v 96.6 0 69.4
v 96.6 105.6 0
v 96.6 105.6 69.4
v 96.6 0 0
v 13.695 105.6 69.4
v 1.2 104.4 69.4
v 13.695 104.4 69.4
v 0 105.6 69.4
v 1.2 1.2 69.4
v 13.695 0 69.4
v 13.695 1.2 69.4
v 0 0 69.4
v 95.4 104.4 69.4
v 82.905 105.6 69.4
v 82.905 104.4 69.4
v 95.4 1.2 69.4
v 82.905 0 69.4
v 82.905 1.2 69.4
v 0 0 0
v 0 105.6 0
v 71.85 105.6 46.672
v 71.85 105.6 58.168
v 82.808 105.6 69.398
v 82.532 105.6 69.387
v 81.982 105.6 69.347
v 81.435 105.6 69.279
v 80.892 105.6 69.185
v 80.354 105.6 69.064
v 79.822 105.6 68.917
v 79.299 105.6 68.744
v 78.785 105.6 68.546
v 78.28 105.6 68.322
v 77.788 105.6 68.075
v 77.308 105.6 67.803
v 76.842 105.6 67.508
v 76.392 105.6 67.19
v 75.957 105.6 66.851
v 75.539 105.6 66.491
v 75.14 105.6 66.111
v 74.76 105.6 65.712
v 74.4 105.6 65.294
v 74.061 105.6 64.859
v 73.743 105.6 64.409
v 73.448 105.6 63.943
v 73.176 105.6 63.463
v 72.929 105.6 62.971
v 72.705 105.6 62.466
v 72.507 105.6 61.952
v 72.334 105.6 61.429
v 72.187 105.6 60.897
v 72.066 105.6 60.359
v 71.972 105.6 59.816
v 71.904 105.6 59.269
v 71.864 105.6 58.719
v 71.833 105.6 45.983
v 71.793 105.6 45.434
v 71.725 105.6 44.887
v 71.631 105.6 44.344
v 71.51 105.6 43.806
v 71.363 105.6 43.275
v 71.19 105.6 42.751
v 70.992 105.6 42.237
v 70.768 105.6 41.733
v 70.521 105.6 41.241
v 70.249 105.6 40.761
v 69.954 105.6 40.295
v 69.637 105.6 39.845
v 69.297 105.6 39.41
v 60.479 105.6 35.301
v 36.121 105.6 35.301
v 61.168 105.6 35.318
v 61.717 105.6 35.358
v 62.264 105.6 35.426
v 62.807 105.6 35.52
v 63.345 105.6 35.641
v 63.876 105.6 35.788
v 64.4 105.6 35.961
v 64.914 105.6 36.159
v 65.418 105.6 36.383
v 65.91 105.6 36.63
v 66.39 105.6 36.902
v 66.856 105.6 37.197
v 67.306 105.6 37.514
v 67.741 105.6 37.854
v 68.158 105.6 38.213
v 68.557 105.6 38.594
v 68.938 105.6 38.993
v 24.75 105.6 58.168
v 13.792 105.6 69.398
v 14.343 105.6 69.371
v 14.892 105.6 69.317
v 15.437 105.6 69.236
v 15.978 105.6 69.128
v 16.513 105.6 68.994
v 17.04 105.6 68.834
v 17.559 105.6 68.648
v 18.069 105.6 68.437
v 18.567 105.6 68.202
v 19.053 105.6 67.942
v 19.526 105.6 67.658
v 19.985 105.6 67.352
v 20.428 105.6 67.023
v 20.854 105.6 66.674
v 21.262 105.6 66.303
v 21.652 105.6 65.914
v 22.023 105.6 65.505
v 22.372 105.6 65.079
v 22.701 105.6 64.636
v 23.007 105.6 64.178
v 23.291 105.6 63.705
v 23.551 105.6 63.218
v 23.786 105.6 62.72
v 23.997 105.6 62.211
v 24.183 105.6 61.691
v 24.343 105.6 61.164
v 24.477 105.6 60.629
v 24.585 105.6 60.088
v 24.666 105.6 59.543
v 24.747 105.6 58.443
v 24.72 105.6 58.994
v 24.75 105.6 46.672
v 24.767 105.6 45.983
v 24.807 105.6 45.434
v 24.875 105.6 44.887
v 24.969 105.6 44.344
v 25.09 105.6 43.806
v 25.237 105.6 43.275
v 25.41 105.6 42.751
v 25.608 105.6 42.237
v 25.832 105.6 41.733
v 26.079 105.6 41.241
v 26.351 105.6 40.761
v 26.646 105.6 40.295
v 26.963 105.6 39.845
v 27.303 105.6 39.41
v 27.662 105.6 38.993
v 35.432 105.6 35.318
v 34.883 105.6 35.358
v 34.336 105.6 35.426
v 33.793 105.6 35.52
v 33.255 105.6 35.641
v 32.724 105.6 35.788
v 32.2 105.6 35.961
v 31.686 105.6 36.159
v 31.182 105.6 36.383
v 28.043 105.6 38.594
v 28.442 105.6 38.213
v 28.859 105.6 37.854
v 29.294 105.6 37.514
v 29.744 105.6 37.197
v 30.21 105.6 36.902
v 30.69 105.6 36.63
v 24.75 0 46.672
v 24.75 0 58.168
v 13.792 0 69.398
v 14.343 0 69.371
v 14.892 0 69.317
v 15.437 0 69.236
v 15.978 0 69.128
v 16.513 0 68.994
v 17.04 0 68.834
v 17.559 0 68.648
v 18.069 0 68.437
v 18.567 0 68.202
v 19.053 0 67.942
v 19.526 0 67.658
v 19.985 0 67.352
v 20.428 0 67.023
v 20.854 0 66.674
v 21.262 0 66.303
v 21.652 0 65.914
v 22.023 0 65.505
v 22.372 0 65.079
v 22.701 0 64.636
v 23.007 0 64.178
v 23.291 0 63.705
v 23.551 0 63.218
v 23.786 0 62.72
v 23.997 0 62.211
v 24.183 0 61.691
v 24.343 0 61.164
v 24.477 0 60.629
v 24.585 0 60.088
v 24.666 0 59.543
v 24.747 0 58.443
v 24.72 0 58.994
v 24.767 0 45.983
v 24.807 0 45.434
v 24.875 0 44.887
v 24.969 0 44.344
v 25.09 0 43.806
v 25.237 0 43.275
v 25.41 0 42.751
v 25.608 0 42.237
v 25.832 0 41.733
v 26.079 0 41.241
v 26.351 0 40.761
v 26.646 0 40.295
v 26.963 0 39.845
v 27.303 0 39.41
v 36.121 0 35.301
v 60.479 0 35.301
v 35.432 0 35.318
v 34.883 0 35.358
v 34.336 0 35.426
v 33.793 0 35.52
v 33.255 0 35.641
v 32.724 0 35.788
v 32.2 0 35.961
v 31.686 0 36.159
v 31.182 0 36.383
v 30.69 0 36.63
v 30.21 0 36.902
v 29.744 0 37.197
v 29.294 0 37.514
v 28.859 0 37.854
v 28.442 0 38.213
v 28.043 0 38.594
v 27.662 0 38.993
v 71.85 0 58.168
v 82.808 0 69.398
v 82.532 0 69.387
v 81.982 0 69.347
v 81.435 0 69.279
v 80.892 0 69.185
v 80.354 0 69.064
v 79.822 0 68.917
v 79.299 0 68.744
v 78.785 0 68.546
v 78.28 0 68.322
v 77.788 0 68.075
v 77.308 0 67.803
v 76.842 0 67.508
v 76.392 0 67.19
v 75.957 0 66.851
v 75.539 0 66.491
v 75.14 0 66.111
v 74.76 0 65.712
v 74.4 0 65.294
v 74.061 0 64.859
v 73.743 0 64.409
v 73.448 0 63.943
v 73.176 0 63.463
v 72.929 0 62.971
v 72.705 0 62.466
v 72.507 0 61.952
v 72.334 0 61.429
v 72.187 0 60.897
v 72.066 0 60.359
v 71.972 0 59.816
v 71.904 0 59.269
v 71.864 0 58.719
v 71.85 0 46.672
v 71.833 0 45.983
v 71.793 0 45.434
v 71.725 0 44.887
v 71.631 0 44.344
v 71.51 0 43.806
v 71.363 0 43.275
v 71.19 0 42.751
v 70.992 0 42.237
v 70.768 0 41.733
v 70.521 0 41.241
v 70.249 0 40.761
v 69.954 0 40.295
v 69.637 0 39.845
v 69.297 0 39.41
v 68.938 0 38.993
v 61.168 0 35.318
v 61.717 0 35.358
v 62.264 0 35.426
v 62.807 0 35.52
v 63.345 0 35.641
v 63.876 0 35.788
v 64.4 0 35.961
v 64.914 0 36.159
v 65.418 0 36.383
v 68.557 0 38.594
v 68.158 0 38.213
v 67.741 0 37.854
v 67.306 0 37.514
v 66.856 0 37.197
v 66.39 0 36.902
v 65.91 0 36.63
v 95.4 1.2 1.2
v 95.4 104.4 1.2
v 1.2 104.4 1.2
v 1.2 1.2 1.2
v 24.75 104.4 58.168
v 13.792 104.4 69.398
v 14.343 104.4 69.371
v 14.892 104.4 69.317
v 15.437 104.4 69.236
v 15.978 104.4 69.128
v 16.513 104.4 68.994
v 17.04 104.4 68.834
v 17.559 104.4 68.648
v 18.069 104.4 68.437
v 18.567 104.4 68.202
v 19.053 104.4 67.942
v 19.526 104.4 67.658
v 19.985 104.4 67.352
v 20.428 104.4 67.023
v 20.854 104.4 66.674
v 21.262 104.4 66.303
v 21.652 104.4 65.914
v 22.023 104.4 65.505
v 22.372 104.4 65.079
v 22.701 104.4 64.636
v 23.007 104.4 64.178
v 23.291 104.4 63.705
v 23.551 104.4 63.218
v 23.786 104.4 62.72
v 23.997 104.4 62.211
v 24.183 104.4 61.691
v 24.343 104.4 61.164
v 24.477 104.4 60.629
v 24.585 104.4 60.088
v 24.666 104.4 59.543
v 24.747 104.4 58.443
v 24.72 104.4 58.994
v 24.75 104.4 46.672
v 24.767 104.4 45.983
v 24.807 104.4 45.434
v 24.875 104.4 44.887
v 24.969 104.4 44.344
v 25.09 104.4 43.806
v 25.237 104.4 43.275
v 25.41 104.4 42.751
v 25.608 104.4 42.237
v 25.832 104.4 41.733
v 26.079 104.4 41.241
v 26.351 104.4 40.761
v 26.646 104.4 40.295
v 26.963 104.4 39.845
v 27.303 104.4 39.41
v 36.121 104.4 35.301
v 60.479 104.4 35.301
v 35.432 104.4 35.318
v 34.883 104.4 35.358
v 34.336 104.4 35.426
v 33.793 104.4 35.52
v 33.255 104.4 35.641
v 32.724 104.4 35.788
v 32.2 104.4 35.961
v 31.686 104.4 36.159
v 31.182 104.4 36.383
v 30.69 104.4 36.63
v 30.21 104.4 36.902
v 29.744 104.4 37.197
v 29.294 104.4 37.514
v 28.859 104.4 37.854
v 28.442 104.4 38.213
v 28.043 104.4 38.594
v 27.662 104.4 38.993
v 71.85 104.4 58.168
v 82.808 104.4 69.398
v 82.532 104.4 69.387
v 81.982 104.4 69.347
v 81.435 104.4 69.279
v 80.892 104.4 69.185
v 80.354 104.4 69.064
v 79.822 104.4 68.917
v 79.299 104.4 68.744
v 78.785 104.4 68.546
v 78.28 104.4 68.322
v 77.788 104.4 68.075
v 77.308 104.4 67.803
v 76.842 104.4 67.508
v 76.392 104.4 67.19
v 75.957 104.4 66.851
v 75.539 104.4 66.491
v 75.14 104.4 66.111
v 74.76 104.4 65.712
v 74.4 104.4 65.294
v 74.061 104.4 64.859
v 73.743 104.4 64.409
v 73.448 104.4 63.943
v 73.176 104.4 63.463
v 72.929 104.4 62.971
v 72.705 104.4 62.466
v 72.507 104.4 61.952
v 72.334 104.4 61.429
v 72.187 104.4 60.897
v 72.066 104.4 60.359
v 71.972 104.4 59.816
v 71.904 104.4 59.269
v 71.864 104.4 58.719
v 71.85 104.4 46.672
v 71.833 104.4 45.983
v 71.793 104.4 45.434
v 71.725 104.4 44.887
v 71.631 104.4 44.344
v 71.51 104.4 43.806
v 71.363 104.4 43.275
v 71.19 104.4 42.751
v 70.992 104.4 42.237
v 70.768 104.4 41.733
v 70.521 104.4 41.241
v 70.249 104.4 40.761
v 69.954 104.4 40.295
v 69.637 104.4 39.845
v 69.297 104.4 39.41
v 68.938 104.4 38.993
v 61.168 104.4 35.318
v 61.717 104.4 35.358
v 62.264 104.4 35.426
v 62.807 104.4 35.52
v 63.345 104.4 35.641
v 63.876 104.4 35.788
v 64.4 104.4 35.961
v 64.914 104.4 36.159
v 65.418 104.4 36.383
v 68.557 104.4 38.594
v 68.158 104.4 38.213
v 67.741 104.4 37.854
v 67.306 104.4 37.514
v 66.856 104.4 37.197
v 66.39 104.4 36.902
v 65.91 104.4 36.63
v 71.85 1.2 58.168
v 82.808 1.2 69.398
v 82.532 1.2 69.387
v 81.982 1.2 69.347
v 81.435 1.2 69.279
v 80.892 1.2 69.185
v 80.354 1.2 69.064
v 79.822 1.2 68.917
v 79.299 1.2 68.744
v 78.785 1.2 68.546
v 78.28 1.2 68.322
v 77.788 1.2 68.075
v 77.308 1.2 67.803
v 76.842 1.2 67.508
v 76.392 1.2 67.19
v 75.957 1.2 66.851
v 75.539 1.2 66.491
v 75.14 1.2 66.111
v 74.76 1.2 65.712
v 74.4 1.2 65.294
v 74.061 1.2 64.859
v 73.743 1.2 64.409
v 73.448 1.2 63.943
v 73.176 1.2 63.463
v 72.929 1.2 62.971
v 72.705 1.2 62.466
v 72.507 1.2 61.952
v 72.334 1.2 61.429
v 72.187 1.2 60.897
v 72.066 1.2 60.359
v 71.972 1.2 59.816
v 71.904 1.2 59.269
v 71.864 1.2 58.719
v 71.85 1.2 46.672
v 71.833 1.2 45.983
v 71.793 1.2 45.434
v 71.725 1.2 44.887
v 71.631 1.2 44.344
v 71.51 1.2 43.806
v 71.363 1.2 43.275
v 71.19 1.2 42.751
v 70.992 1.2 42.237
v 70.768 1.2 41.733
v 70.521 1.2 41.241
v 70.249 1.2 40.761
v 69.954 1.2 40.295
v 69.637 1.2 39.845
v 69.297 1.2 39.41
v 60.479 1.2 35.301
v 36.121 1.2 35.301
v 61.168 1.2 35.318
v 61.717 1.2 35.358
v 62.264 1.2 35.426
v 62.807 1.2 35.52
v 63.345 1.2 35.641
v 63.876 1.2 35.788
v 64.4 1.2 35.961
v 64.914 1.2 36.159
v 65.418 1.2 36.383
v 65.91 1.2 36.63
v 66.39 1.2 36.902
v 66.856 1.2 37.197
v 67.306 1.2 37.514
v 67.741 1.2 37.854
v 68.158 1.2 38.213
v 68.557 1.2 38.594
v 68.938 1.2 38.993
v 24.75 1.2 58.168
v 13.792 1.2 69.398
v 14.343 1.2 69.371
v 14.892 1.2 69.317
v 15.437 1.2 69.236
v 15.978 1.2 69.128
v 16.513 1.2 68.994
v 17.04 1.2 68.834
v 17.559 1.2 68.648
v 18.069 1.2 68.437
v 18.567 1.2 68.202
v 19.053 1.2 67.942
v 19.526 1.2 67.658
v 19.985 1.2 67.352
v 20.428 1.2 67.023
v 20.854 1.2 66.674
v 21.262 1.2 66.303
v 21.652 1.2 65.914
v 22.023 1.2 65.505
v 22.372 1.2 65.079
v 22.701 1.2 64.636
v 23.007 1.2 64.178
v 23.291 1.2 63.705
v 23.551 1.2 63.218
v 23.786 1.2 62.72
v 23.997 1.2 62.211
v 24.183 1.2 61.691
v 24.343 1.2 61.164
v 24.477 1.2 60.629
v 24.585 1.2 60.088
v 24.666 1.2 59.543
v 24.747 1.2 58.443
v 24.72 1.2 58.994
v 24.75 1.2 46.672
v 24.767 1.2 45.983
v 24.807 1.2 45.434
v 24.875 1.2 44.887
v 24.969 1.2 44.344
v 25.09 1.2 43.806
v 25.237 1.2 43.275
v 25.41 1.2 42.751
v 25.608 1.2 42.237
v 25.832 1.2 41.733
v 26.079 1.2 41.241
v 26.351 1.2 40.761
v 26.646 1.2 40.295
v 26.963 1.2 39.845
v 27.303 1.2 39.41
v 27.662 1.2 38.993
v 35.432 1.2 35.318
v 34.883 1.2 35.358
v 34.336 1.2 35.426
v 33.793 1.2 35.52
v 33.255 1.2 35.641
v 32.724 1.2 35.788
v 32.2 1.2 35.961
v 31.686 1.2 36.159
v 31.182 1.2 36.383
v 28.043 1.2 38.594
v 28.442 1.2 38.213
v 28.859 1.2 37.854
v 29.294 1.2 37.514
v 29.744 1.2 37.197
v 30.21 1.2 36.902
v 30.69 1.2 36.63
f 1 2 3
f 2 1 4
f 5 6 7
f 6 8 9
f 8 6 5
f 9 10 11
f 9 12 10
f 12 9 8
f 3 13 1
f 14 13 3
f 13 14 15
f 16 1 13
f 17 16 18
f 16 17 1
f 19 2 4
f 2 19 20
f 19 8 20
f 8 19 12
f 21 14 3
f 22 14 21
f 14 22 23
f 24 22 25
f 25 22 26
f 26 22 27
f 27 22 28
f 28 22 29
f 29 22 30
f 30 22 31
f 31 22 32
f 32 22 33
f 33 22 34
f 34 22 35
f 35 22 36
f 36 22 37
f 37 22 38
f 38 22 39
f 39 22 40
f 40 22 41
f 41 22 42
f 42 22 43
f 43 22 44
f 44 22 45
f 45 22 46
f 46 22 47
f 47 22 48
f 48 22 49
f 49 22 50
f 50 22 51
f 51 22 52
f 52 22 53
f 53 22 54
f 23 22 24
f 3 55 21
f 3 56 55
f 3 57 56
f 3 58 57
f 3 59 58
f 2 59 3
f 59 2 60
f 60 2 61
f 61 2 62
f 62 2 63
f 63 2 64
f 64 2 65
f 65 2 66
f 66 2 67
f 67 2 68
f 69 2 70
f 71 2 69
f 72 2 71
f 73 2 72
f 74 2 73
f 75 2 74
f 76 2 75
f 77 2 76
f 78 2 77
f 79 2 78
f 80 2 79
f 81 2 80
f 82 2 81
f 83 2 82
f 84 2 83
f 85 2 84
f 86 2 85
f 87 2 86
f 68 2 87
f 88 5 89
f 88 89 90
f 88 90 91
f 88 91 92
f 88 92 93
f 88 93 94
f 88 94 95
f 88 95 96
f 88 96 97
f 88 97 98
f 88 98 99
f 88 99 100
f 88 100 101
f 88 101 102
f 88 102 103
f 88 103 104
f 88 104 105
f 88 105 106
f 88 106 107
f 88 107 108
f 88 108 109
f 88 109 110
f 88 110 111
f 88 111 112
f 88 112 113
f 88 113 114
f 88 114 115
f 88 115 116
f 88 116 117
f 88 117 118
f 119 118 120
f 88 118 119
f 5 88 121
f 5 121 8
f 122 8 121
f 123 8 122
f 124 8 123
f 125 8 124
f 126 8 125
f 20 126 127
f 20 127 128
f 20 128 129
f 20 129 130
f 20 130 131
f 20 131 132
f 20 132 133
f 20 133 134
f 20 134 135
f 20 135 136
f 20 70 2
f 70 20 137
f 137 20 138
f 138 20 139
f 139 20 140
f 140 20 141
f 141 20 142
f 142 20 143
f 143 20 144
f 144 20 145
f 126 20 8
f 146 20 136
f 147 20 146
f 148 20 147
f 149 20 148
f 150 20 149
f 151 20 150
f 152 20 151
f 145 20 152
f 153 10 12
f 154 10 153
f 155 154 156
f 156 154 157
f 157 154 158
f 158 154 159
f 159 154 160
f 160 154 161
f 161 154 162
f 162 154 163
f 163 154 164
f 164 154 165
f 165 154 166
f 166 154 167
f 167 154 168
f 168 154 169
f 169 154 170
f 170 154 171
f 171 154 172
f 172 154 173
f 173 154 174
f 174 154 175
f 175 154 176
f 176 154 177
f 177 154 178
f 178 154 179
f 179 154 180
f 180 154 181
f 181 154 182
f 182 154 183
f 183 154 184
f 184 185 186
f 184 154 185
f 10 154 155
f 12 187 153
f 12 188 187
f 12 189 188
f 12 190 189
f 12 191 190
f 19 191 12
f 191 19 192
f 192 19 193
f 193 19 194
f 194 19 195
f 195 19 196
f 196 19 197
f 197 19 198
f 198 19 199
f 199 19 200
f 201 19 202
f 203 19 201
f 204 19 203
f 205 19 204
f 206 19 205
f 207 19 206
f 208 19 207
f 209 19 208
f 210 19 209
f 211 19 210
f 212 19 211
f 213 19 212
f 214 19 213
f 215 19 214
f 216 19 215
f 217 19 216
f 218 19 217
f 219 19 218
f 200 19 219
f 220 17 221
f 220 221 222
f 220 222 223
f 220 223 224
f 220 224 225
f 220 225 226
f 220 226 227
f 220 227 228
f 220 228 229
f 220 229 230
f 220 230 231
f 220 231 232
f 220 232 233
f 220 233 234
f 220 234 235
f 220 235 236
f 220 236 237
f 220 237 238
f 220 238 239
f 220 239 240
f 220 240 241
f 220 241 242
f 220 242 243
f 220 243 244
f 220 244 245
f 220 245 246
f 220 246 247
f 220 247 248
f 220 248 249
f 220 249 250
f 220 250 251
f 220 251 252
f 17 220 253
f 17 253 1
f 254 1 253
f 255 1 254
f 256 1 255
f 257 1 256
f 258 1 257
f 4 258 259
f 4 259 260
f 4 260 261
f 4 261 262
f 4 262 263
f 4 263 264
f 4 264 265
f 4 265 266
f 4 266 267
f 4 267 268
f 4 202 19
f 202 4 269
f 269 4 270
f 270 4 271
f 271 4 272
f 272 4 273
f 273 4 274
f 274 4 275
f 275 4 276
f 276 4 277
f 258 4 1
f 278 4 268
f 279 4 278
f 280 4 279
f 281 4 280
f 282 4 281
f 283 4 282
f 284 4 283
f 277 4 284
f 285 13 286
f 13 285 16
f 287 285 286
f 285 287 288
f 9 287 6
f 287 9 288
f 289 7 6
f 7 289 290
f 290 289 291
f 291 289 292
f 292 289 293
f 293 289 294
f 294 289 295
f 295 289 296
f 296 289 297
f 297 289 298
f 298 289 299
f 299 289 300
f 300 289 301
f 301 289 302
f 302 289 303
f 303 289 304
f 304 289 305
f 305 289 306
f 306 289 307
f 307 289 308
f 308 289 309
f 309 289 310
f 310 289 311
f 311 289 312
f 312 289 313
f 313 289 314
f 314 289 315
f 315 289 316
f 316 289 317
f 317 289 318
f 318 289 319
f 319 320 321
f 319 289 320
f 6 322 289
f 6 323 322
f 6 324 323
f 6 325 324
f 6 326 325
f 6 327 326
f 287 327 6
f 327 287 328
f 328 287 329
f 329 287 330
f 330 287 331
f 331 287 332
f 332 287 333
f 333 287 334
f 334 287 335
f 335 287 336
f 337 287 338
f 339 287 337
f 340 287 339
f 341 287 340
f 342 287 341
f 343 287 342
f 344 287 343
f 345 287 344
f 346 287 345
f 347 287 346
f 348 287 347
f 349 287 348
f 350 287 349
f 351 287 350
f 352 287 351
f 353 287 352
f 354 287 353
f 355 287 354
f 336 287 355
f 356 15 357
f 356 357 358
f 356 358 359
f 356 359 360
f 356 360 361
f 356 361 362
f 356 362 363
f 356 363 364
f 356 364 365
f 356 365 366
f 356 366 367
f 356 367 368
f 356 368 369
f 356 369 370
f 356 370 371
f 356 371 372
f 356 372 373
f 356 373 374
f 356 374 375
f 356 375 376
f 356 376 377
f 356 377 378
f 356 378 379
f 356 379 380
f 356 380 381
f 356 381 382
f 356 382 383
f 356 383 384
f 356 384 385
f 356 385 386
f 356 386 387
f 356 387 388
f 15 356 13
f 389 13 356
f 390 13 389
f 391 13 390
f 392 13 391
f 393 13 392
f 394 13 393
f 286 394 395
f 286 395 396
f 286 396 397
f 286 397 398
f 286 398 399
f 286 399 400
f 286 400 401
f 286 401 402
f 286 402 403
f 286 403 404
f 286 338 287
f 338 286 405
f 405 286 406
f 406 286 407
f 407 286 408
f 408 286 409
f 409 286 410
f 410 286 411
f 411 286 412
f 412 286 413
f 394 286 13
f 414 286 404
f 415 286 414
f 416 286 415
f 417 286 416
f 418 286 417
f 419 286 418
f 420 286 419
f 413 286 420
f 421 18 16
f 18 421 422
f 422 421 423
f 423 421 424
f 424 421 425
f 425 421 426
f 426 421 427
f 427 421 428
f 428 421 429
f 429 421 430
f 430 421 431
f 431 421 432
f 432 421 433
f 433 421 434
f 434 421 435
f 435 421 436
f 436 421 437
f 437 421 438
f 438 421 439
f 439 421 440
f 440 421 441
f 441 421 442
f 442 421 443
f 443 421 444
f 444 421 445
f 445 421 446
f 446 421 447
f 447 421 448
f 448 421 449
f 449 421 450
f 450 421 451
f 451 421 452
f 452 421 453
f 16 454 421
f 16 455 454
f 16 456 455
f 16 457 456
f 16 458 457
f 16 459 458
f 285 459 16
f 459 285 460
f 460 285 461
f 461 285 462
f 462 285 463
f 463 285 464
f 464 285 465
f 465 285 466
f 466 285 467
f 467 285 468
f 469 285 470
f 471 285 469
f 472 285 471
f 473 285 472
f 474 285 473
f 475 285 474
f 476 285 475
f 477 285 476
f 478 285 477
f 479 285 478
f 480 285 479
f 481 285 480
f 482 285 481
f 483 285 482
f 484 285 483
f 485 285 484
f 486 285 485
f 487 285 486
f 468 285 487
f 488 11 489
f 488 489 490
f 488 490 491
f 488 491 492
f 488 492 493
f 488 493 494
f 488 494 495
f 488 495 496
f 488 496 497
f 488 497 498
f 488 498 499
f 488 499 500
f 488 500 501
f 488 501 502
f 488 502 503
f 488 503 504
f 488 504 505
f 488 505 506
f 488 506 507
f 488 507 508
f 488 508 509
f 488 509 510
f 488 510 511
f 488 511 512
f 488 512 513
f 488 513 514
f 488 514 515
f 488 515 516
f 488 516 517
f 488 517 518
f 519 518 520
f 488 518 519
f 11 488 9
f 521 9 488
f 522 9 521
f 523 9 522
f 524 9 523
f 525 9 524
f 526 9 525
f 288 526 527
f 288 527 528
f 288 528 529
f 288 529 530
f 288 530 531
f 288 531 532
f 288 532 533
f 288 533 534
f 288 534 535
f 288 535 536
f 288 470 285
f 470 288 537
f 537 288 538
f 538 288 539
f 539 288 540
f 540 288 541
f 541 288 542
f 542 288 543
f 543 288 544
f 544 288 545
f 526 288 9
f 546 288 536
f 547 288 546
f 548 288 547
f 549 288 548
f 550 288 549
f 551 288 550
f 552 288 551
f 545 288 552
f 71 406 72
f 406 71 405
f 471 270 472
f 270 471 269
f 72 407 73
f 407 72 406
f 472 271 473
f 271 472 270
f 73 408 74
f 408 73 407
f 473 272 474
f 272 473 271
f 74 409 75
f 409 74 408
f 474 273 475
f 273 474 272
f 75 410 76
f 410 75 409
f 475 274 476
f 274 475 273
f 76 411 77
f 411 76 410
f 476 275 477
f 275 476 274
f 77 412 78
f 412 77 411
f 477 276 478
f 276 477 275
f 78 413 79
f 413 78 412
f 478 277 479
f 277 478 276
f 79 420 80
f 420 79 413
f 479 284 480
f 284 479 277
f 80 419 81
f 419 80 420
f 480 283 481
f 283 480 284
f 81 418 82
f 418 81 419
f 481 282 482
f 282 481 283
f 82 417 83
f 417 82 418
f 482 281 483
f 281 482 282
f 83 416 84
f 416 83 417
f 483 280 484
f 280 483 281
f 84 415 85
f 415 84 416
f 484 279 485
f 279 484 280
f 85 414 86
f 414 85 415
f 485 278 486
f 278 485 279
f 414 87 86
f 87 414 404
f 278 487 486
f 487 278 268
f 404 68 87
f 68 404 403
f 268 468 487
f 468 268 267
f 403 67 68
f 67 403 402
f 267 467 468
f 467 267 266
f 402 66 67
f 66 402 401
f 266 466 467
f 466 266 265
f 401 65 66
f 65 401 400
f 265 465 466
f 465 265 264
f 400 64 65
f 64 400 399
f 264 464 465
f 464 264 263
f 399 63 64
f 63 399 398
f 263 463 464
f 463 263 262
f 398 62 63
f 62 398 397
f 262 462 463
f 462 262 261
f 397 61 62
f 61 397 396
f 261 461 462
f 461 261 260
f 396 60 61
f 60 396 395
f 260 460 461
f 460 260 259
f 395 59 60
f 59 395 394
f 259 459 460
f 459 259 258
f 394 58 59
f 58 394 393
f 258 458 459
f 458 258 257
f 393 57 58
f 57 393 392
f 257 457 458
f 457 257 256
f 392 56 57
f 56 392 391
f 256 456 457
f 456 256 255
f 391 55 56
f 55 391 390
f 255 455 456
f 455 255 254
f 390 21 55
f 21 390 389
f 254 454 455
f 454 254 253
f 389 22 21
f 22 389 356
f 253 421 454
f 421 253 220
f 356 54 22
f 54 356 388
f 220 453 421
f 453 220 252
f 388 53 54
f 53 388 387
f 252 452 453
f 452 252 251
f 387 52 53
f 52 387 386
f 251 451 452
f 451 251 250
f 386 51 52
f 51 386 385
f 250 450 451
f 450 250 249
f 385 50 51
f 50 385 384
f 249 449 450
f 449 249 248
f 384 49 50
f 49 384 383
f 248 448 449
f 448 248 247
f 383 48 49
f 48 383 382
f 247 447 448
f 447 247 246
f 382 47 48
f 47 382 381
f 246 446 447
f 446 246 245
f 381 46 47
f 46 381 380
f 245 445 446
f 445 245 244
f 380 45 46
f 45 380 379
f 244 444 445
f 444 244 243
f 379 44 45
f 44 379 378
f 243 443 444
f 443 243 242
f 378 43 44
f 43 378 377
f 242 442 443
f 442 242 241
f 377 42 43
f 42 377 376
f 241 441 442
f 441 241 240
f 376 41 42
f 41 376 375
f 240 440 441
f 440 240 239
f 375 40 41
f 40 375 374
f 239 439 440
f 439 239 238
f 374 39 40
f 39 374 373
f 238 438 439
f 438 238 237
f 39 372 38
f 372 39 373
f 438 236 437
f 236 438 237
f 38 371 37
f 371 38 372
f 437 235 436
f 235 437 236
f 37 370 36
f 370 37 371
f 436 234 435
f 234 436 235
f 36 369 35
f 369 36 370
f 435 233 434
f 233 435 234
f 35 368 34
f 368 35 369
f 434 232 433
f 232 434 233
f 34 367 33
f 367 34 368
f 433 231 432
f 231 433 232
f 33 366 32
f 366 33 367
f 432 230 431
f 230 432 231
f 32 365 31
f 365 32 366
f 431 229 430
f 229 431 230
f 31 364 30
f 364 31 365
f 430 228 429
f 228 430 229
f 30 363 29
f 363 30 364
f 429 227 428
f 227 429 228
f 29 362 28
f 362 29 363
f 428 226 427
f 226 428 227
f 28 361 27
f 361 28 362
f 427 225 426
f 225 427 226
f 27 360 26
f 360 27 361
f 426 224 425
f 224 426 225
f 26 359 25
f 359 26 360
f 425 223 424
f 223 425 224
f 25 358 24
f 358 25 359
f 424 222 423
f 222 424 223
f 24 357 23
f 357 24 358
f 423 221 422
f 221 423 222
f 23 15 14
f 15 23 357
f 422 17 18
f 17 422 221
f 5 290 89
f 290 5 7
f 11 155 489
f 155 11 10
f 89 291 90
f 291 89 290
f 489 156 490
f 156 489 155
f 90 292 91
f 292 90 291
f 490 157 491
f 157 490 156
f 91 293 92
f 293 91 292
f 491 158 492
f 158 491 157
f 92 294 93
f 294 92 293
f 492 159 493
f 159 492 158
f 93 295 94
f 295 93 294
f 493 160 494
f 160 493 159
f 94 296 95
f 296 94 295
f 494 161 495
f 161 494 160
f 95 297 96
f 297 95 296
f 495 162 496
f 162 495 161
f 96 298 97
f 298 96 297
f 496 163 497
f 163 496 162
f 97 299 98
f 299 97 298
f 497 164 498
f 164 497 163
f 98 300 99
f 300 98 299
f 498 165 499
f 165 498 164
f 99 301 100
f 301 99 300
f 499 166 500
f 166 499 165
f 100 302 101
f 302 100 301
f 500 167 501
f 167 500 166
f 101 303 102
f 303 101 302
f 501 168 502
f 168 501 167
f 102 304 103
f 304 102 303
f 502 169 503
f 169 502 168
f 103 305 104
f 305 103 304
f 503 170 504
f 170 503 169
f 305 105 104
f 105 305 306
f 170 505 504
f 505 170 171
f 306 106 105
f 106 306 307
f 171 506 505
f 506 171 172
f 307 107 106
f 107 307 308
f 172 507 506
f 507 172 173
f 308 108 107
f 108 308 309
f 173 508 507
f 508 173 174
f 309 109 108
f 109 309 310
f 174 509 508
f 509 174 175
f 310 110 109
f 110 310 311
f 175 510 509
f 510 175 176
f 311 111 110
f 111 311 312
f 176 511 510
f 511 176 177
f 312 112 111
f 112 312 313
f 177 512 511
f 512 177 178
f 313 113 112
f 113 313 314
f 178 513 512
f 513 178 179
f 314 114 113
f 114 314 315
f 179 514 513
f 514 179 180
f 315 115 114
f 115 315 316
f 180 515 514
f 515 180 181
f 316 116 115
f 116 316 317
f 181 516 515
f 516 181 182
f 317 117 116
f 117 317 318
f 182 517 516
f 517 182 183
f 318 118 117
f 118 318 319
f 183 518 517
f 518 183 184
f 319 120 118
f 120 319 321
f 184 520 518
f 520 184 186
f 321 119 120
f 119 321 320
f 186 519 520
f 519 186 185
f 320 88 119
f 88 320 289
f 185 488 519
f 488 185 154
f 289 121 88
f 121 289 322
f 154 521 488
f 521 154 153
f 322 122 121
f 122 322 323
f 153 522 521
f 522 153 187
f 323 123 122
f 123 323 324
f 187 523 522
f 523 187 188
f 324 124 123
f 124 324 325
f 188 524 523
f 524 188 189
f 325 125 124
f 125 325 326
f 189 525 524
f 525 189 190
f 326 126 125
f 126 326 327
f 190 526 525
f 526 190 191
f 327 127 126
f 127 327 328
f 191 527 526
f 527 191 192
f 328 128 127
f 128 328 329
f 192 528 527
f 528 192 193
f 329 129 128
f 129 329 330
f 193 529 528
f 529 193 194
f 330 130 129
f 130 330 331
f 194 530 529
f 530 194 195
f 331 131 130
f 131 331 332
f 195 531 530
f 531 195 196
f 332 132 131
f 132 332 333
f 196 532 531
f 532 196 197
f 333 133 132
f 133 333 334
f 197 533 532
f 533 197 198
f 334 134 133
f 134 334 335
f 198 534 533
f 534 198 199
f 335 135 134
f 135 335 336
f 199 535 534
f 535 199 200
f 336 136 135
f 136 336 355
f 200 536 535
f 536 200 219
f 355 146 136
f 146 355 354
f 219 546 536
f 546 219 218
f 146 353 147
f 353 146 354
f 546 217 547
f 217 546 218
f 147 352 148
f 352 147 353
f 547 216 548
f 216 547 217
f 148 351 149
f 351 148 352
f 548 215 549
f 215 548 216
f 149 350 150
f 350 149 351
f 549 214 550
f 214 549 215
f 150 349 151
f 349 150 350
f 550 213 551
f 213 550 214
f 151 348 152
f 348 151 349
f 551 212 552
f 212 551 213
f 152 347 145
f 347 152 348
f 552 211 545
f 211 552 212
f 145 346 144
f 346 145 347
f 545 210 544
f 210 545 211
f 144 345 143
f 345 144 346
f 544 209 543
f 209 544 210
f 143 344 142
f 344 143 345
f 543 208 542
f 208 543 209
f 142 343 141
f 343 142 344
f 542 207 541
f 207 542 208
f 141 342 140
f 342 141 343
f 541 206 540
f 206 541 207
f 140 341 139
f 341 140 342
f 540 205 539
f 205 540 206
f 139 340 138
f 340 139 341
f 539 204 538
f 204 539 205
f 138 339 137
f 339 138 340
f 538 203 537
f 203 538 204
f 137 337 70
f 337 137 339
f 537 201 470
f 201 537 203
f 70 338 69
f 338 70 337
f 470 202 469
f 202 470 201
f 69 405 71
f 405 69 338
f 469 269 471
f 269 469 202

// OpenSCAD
// file: ../../internal/tray.scad
// Copyright 2023 Joshua Star, All Rights Reserved

include <base.scad>
include <prim.scad>

module tray_basic(inner_size, r=0, thickness=DEFAULT_THICKNESS, bottom_thickness=undef) {

	half_z = inner_size.z / 2;
	radius = min(r, half_z);

	bottom_thk = bottom_thickness != undef ? bottom_thickness : thickness;

	thk2 = thickness * 2;

	outer_size = inner_size + [thk2, thk2, bottom_thk];
	echo("tray outer dimensions are: ", outer_size);

	inner_radius = radius - thickness;

	union() {
		difference() {
			// outer shell
			if (0 < r) {
				union() {
					translate([0, 0, bottom_thk])
						cylinder_cube([outer_size.x, outer_size.y, outer_size.z - bottom_thk], r=radius);
					cylinder_cube([outer_size.x, outer_size.y, bottom_thk], inner_radius, radius);
				}
			}
			else {
				cube(outer_size);
			}
			
			// lip cutout
			if (0 < radius) {
				translate([0, 0, inner_size.z + SMALL_NUM])
					cylinder_cube([outer_size.x, outer_size.y, bottom_thk], r1=inner_radius, r2=radius);
			}

			// inner cutout
			if (0 < radius) {
				translate([thickness, thickness, bottom_thk])
					rounded_cube(inner_size + [0, 0, bottom_thk], r=inner_radius, flat_top=true);
			}
			else {
				translate([thickness, thickness, bottom_thk])
						cube(inner_size + [0, 0, bottom_thk]);
			}
		}
	}
}

module tray_divided(size, r=0, div_x=1, div_y=1, thickness=DEFAULT_THICKNESS, bottom_thickness=undef, div_height=undef, div_thickness=undef) {

	bottom_thk = bottom_thickness != undef ? bottom_thickness : thickness;

	div_thk = div_thickness != undef ? div_thickness : thickness;
	div_z = div_height != undef ? div_height : size.z;

	max_div_z = 0 == r ? size.z : size.z - bottom_thk;
	clamped_div_z = min(div_z, max_div_z);

	x_minus_div = size.x - (div_thk * (div_x - 1));
	y_minus_div = size.y - (div_thk * (div_y - 1));

	x_off = (x_minus_div / div_x) + div_thk;
	y_off = (y_minus_div / div_y) + div_thk;
	
	union() {
		tray_basic(size, r=r, thickness=thickness, bottom_thickness=bottom_thk);

		// columns, along x
		for (i=[1:1:div_x-1]) {
			translate([i * x_off, thickness, bottom_thk])
				cube([div_thk, size.y, clamped_div_z]);
		}

		// rows, along y
		for (i=[1:1:div_y-1]) {
			translate([thickness, i * y_off, bottom_thk])
				cube([size.x, div_thk, clamped_div_z]);
		}
	}
}

module notch_cutter(h, r) {
	n = 6;
	rotate([0, 0, 180 / n]) cylinder_ngon(2 * r, h, n);
}

module tray_notched(size, div_x=1, div_y=1, thickness=DEFAULT_THICKNESS, bottom_thickness=undef, div_height=undef, div_thickness=undef, notch_lo_x=true, notch_hi_x=true) {

	bottom_thk = bottom_thickness != undef ? bottom_thickness : thickness;

	div_thk = div_thickness != undef ? div_thickness : thickness;
	div_z = div_height != undef ? div_height : size.z;

	x_minus_div = size.x - (div_thk * (div_x - 1));

	x_off = (x_minus_div / div_x) + div_thk;
	
	div_bias = (div_thk - x_off) / 2;

	notch_h = size.z + bottom_thk + 2 * SMALL_NUM;
	notch_r = x_off / 3;

	difference() {
		tray_divided(size, div_x=div_x, div_y=div_y, thickness=thickness, bottom_thickness=bottom_thk, div_height=div_z, div_thickness=div_thk);

		// notch along x
		for (i=[1:1:div_x]) {

			if (notch_lo_x) {
				translate([i * x_off + div_bias, thickness, -SMALL_NUM])
					notch_cutter(notch_h, notch_r);
			}

			if (notch_hi_x) {
				translate([i * x_off + div_bias, size.y + thickness, -SMALL_NUM])
					notch_cutter(notch_h, notch_r);
			}
		}
	}
}

// --- TESTING ---

//tray_basic([240, 120, 30], r=4);

//translate([-1.2, -1.2, 0]) tray_divided([200, 100, 5], div_x=20, div_y=10);
//tray_divided([180, 120, 30], r=15, div_x=3, div_y=2, div_height=25);

//translate([-1.2, -1.2, 0]) tray_notched([200, 100, 30], div_x=20, div_y=10);
// file: ../../internal/prim.scad
// Copyright 2023 Joshua Star, All Rights Reserved

module cylinder_cube(size, r1=1, r2=1, r=undef) {
	r1 = r != undef ? r : r1;
	r2 = r != undef ? r : r2;

	r_max = max(r1, r2);
	hull() {
		translate([r_max, r_max, 0])
			cylinder(size.z, r1, r2);
		translate([size.x - r_max, r_max, 0])
			cylinder(size.z, r1, r2);
		translate([r_max, size.y - r_max, 0])
			cylinder(size.z, r1, r2);
		translate([size.x - r_max, size.y - r_max, 0])
			cylinder(size.z, r1, r2);
	}
}

module cylinder_ngon(width, h, n=6, r=1) {
	hull() {
		for (i=[0:1:n-1]) {
			angl_off = 360 / n;
			posx_off = width / 2 - r;
			rotate([0, 0, i * angl_off]) translate([posx_off, 0, 0])
				cylinder(r=r, h=h);
		}
	}
}

module cylinder_trap(size, ratio, radius=1) {
	hull() {
		half_size_x = size.x / 2;
		translate([radius - half_size_x, radius, 0])
			cylinder(r=radius, h=size.z);
		translate([half_size_x - radius, radius, 0])
			cylinder(r=radius, h=size.z);
		translate([radius - ratio * half_size_x, size.y - radius, 0])
			cylinder(r=radius, h=size.z);
		translate([ratio * half_size_x - radius, size.y - radius, 0])
			cylinder(r=radius, h=size.z);
	}
}

module rounded_cube(size, r=1, flat_top=false) {
	
	half_z = size.z / 2;
	radius = min(r, half_z);
	
	hull() {
		// bottom 'points'
		translate([radius,radius,radius]) sphere(r=radius);
		translate([size.x-radius,radius,radius]) sphere(r=radius);
		translate([radius,size.y-radius,radius]) sphere(r=radius);
		translate([size.x-radius,size.y-radius,radius]) sphere(r=radius);

		// top 'points'
		pos_z = size.z - radius;
		if (flat_top) {
			translate([radius, radius, pos_z]) cylinder(r=radius, h=radius);
			translate([size.x-radius, radius, pos_z]) cylinder(r=radius, h=radius);
			translate([radius, size.y-radius, pos_z]) cylinder(r=radius, h=radius);
			translate([size.x-radius, size.y-radius, pos_z]) cylinder(r=radius, h=radius);
		}
		else {
			translate([radius, radius, pos_z]) sphere(r=radius);
			translate([size.x-radius, radius, pos_z]) sphere(r=radius);
			translate([radius, size.y-radius, pos_z]) sphere(r=radius);
			translate([size.x-radius, size.y-radius, pos_z]) sphere(r=radius);
		}
	}
}

// --- TESTING ---

//cylinder_cube([240, 120, 30], r=8);

//cylinder_cube([240, 120, 16], r1=4, r2=8);
//cylinder_cube([240, 120, 16], r1=8, r2=4);

//cylinder_ngon(10, 5, 7, 1);

//cylinder_trap([100, 50, 30], 0.5, radius=8);

//rounded_cube([240, 120, 30], r=12);
//rounded_cube([240, 120, 30], r=12, flat_top=true);
//rounded_cube([240, 120, 30], r=30, flat_top=true);
// file: ../../internal/math.scad
// Copyright 2023 Joshua Star, All Rights Reserved

function clamp(x, lower, upper) = x < lower ? lower : (upper < x ? upper : x);
function lerp(lower, upper, s) = (upper - lower) * s + lower;
// file: ../../internal/card.scad
// Copyright 2023 Joshua Star, All Rights Reserved

TOLERANCE_MIN = [0.4, 0.4];
TOLERANCE_MAX = [0.8, 0.8];

function std_card_dim() = [67, 93] + TOLERANCE_MIN; // gray
function amer_card_dim() = [59, 91] + TOLERANCE_MIN; // green
function euro_card_dim() = [62, 94] + TOLERANCE_MIN; // purple

function mini_amer_card_dim() = [44, 67] + TOLERANCE_MIN; // yellow
function mini_euro_card_dim() = [46, 71] + TOLERANCE_MIN; // ruby

function 7won_card_dim() = [67, 103] + TOLERANCE_MAX; // brown
function tarot_card_dim() = [73, 122] + TOLERANCE_MAX; // orange

function per_card_thickness() = 0.68;

function calc_card_stack(n, padding=1.2) = n * per_card_thickness() + padding;
// file: ../../internal/base.scad
// Copyright 2023 Joshua Star, All Rights Reserved

fn = $preview ? 16 : 128;
$fn = fn;

SMALL_NUM = $preview ? 0.02 : 0.001;

DEFAULT_PADDING = 1.6;
DEFAULT_THICKNESS = 1.2;
// file: ../../boardgame_tk.scad
// Copyright 2023 Joshua Star, All Rights Reserved

include <internal/base.scad>
include <internal/card.scad>
include <internal/math.scad>
include <internal/prim.scad>
include <internal/tray.scad>

function default_padding() = DEFAULT_PADDING;
function default_thickness() = DEFAULT_THICKNESS;

function gamebox_common() = [286, 286, 68]; // Terraforming Mars, Wingspan

function make_list(v, n) = [for(i=[0:n-1]) v];
function sum_list(v) = [for(p=v) 1] * v;

module card_display(card_size, height, num_stacks, padding=DEFAULT_PADDING, thickness=DEFAULT_THICKNESS, bottom_thickness=undef, div_thickness=undef) {

	div_thk = div_thickness != undef ? div_thickness : thickness;

	dim_x = (card_size.x + padding) * num_stacks + (div_thk * (num_stacks - 1));
	dim_y = card_size.y + padding;
	dim_z = height;

	tray_notched([dim_x, dim_y, dim_z], div_x=num_stacks, thickness=thickness, bottom_thickness=bottom_thickness, div_thickness=div_thickness, notch_hi_x=false);
}

module vertical_cutter(size, r=0.5) {
	difference() {
		translate([0, size.z, 0]) rotate([90, 0, 0])
		linear_extrude(height=size.z) {
			translate([0, r, 0])
			offset(r=-r) {
				offset(r=2*r) {
					union() {
						translate([-(size.x + 2 * r) / 2, 0, 0]) square([size.x + 2 * r, 1]);
						translate([-(size.x - 2 * r)/2, -size.y, 0]) square([size.x - 2 * r, size.y]);
					}
				}
			}
		}

		translate([-(size.x + r), -size.z, 0])
			cube([2 * (size.x + r), 3 * size.z, 2 * (size.y + r)]);
	}
}

module card_tray(card_size, stacks, num_columns=1, padding=[0.8, 0.8, 0.8], thickness=DEFAULT_THICKNESS, bottom_thickness=undef, div_height=undef, div_thickness=undef) {

	bottom_thk = bottom_thickness != undef ? bottom_thickness : thickness;

	div_thk = div_thickness != undef ? div_thickness : thickness;

	col_dim_x = card_size.y + padding.x;

	dim_x = col_dim_x * num_columns + div_thk * (num_columns - 1);
	dim_y = sum_list(stacks) + (div_thk + padding.y) * (len(stacks) - 1);
	dim_z = card_size.x + padding.z;

	div_z = div_height != undef ? div_height : dim_z;

	min_card_dim = min(card_size.x, card_size.y);
	cutter_radius = min_card_dim / 6;

	difference() {
		union() {
			tray_divided([dim_x, dim_y, dim_z], div_x=num_columns, thickness=thickness, bottom_thickness=bottom_thickness);

			div_offsets = [
				for (a=0, b=stacks[0]; a < (len(stacks) - 1); a = a + 1, b = b + (stacks[a]==undef?0:stacks[a]) + padding.y + div_thk)
					b
				];

			// columns, along x
			for (c=[0:1:num_columns-1]) {
				// rows, along y
				for (y=div_offsets) {
					x_off = c * (col_dim_x + div_thk) + thickness;

					translate([x_off, y, bottom_thk])
						cube([col_dim_x, div_thk, div_z]);
				}
			}
		}

		cutout_size = [col_dim_x / 2, dim_z / 2, thickness + 2 * SMALL_NUM];
		cutout_z = bottom_thk + dim_z + SMALL_NUM;

		// cutout
		for (c=[0:1:num_columns-1]) {
			n = 8;

			x_off = c * (col_dim_x + div_thk) + (col_dim_x / 2) + thickness;

			// front cut
			translate([x_off, -SMALL_NUM, cutout_z])
					vertical_cutter(cutout_size, r=cutter_radius);
			
			// back cut
			translate([x_off, dim_y + thickness - SMALL_NUM, cutout_z])
					vertical_cutter(cutout_size, r=cutter_radius);
			
			// middle cut
			translate([x_off, thickness, bottom_thk + div_z + SMALL_NUM])
					vertical_cutter([cutout_size.x, div_z / 2, dim_y], r=cutter_radius);
		}
	}
}

module spacer(size, r=16, div_x=2, div_y=2, spacing=16) {
	difference() {
		cylinder_cube(size, r=r);

		half_spacing = spacing / 2;
		inner_radius = r - half_spacing;

		offset_x = size.x / div_x;
		offset_y = size.y / div_y;
		for (i=[0:1:div_x]) {
			for (j=[0:1:div_y]) {
				translate([i * offset_x + half_spacing, j * offset_y + half_spacing, -1])
				cylinder_cube([
					size.x / div_x - spacing,
					size.y / div_y - spacing,
					size.z + 2], r=inner_radius);
			}
		}
	}
}

module pegs_grid(rows=1, cols=1, radius=1, height=1, spacing=1, alt_pack=false) {
	x_start = spacing + radius;
	y_start = spacing + radius;

	x_alt_start = radius + spacing / 2;

	x_offset = 2 * radius + spacing;
	y_offset = alt_pack ? ((radius + spacing / 2) * sqrt(3)) : 2 * radius + spacing;

	for (r=[0:1:rows-1]) {
		is_alt = alt_pack ? (r % 2) : 0;
		for (c=[0:1:cols-(1 + is_alt)]) {
			translate([
					c * x_offset + x_start + x_alt_start * is_alt,
					r * y_offset + y_start,
					0])
				cylinder(h=height, r=radius);
		}
	}
}

module peg_board(rows=1, cols=1, radius=1, height=1, spacing=1) {
	difference() {
		cylinder_cube([
			cols * 2 * radius + (cols + 1) * spacing,
			rows * 2 * radius + (rows + 1) * spacing,
			height], r=radius);

		translate([0, 0, -height/2])
			pegs_grid(rows=rows, cols=cols, radius=radius, height=2*height, spacing=spacing, alt_pack=false);
	}
}

// --- TESTING ---

//%cube(gamebox_common());

//card_display(mini_euro_card_dim(), 30, 3);

//vertical_cutter([100,50, 10], r=10);

//card_tray(std_card_dim(), [30, 30, 8, 8, 8, 16, 42], num_columns=4, div_height=55);

//spacer([240, 120, 10], r=16, div_x=4, div_y=3, spacing=8);

//pegs_grid(rows=4, cols=5, radius=32, height=4, spacing=6, alt_pack=false);
//pegs_grid(rows=4, cols=5, radius=32, height=4, spacing=6, alt_pack=true);

//peg_board(rows=3, cols=4, radius=28, height=4, spacing=6);
// main file
// Copyright 2023 Joshua Star, All Rights Reserved

use <../../boardgame_tk.scad>

tile_tray_y = 105.6;
dim_y = tile_tray_y - 2 * default_thickness();

card_tray(std_card_dim(), [dim_y]);
